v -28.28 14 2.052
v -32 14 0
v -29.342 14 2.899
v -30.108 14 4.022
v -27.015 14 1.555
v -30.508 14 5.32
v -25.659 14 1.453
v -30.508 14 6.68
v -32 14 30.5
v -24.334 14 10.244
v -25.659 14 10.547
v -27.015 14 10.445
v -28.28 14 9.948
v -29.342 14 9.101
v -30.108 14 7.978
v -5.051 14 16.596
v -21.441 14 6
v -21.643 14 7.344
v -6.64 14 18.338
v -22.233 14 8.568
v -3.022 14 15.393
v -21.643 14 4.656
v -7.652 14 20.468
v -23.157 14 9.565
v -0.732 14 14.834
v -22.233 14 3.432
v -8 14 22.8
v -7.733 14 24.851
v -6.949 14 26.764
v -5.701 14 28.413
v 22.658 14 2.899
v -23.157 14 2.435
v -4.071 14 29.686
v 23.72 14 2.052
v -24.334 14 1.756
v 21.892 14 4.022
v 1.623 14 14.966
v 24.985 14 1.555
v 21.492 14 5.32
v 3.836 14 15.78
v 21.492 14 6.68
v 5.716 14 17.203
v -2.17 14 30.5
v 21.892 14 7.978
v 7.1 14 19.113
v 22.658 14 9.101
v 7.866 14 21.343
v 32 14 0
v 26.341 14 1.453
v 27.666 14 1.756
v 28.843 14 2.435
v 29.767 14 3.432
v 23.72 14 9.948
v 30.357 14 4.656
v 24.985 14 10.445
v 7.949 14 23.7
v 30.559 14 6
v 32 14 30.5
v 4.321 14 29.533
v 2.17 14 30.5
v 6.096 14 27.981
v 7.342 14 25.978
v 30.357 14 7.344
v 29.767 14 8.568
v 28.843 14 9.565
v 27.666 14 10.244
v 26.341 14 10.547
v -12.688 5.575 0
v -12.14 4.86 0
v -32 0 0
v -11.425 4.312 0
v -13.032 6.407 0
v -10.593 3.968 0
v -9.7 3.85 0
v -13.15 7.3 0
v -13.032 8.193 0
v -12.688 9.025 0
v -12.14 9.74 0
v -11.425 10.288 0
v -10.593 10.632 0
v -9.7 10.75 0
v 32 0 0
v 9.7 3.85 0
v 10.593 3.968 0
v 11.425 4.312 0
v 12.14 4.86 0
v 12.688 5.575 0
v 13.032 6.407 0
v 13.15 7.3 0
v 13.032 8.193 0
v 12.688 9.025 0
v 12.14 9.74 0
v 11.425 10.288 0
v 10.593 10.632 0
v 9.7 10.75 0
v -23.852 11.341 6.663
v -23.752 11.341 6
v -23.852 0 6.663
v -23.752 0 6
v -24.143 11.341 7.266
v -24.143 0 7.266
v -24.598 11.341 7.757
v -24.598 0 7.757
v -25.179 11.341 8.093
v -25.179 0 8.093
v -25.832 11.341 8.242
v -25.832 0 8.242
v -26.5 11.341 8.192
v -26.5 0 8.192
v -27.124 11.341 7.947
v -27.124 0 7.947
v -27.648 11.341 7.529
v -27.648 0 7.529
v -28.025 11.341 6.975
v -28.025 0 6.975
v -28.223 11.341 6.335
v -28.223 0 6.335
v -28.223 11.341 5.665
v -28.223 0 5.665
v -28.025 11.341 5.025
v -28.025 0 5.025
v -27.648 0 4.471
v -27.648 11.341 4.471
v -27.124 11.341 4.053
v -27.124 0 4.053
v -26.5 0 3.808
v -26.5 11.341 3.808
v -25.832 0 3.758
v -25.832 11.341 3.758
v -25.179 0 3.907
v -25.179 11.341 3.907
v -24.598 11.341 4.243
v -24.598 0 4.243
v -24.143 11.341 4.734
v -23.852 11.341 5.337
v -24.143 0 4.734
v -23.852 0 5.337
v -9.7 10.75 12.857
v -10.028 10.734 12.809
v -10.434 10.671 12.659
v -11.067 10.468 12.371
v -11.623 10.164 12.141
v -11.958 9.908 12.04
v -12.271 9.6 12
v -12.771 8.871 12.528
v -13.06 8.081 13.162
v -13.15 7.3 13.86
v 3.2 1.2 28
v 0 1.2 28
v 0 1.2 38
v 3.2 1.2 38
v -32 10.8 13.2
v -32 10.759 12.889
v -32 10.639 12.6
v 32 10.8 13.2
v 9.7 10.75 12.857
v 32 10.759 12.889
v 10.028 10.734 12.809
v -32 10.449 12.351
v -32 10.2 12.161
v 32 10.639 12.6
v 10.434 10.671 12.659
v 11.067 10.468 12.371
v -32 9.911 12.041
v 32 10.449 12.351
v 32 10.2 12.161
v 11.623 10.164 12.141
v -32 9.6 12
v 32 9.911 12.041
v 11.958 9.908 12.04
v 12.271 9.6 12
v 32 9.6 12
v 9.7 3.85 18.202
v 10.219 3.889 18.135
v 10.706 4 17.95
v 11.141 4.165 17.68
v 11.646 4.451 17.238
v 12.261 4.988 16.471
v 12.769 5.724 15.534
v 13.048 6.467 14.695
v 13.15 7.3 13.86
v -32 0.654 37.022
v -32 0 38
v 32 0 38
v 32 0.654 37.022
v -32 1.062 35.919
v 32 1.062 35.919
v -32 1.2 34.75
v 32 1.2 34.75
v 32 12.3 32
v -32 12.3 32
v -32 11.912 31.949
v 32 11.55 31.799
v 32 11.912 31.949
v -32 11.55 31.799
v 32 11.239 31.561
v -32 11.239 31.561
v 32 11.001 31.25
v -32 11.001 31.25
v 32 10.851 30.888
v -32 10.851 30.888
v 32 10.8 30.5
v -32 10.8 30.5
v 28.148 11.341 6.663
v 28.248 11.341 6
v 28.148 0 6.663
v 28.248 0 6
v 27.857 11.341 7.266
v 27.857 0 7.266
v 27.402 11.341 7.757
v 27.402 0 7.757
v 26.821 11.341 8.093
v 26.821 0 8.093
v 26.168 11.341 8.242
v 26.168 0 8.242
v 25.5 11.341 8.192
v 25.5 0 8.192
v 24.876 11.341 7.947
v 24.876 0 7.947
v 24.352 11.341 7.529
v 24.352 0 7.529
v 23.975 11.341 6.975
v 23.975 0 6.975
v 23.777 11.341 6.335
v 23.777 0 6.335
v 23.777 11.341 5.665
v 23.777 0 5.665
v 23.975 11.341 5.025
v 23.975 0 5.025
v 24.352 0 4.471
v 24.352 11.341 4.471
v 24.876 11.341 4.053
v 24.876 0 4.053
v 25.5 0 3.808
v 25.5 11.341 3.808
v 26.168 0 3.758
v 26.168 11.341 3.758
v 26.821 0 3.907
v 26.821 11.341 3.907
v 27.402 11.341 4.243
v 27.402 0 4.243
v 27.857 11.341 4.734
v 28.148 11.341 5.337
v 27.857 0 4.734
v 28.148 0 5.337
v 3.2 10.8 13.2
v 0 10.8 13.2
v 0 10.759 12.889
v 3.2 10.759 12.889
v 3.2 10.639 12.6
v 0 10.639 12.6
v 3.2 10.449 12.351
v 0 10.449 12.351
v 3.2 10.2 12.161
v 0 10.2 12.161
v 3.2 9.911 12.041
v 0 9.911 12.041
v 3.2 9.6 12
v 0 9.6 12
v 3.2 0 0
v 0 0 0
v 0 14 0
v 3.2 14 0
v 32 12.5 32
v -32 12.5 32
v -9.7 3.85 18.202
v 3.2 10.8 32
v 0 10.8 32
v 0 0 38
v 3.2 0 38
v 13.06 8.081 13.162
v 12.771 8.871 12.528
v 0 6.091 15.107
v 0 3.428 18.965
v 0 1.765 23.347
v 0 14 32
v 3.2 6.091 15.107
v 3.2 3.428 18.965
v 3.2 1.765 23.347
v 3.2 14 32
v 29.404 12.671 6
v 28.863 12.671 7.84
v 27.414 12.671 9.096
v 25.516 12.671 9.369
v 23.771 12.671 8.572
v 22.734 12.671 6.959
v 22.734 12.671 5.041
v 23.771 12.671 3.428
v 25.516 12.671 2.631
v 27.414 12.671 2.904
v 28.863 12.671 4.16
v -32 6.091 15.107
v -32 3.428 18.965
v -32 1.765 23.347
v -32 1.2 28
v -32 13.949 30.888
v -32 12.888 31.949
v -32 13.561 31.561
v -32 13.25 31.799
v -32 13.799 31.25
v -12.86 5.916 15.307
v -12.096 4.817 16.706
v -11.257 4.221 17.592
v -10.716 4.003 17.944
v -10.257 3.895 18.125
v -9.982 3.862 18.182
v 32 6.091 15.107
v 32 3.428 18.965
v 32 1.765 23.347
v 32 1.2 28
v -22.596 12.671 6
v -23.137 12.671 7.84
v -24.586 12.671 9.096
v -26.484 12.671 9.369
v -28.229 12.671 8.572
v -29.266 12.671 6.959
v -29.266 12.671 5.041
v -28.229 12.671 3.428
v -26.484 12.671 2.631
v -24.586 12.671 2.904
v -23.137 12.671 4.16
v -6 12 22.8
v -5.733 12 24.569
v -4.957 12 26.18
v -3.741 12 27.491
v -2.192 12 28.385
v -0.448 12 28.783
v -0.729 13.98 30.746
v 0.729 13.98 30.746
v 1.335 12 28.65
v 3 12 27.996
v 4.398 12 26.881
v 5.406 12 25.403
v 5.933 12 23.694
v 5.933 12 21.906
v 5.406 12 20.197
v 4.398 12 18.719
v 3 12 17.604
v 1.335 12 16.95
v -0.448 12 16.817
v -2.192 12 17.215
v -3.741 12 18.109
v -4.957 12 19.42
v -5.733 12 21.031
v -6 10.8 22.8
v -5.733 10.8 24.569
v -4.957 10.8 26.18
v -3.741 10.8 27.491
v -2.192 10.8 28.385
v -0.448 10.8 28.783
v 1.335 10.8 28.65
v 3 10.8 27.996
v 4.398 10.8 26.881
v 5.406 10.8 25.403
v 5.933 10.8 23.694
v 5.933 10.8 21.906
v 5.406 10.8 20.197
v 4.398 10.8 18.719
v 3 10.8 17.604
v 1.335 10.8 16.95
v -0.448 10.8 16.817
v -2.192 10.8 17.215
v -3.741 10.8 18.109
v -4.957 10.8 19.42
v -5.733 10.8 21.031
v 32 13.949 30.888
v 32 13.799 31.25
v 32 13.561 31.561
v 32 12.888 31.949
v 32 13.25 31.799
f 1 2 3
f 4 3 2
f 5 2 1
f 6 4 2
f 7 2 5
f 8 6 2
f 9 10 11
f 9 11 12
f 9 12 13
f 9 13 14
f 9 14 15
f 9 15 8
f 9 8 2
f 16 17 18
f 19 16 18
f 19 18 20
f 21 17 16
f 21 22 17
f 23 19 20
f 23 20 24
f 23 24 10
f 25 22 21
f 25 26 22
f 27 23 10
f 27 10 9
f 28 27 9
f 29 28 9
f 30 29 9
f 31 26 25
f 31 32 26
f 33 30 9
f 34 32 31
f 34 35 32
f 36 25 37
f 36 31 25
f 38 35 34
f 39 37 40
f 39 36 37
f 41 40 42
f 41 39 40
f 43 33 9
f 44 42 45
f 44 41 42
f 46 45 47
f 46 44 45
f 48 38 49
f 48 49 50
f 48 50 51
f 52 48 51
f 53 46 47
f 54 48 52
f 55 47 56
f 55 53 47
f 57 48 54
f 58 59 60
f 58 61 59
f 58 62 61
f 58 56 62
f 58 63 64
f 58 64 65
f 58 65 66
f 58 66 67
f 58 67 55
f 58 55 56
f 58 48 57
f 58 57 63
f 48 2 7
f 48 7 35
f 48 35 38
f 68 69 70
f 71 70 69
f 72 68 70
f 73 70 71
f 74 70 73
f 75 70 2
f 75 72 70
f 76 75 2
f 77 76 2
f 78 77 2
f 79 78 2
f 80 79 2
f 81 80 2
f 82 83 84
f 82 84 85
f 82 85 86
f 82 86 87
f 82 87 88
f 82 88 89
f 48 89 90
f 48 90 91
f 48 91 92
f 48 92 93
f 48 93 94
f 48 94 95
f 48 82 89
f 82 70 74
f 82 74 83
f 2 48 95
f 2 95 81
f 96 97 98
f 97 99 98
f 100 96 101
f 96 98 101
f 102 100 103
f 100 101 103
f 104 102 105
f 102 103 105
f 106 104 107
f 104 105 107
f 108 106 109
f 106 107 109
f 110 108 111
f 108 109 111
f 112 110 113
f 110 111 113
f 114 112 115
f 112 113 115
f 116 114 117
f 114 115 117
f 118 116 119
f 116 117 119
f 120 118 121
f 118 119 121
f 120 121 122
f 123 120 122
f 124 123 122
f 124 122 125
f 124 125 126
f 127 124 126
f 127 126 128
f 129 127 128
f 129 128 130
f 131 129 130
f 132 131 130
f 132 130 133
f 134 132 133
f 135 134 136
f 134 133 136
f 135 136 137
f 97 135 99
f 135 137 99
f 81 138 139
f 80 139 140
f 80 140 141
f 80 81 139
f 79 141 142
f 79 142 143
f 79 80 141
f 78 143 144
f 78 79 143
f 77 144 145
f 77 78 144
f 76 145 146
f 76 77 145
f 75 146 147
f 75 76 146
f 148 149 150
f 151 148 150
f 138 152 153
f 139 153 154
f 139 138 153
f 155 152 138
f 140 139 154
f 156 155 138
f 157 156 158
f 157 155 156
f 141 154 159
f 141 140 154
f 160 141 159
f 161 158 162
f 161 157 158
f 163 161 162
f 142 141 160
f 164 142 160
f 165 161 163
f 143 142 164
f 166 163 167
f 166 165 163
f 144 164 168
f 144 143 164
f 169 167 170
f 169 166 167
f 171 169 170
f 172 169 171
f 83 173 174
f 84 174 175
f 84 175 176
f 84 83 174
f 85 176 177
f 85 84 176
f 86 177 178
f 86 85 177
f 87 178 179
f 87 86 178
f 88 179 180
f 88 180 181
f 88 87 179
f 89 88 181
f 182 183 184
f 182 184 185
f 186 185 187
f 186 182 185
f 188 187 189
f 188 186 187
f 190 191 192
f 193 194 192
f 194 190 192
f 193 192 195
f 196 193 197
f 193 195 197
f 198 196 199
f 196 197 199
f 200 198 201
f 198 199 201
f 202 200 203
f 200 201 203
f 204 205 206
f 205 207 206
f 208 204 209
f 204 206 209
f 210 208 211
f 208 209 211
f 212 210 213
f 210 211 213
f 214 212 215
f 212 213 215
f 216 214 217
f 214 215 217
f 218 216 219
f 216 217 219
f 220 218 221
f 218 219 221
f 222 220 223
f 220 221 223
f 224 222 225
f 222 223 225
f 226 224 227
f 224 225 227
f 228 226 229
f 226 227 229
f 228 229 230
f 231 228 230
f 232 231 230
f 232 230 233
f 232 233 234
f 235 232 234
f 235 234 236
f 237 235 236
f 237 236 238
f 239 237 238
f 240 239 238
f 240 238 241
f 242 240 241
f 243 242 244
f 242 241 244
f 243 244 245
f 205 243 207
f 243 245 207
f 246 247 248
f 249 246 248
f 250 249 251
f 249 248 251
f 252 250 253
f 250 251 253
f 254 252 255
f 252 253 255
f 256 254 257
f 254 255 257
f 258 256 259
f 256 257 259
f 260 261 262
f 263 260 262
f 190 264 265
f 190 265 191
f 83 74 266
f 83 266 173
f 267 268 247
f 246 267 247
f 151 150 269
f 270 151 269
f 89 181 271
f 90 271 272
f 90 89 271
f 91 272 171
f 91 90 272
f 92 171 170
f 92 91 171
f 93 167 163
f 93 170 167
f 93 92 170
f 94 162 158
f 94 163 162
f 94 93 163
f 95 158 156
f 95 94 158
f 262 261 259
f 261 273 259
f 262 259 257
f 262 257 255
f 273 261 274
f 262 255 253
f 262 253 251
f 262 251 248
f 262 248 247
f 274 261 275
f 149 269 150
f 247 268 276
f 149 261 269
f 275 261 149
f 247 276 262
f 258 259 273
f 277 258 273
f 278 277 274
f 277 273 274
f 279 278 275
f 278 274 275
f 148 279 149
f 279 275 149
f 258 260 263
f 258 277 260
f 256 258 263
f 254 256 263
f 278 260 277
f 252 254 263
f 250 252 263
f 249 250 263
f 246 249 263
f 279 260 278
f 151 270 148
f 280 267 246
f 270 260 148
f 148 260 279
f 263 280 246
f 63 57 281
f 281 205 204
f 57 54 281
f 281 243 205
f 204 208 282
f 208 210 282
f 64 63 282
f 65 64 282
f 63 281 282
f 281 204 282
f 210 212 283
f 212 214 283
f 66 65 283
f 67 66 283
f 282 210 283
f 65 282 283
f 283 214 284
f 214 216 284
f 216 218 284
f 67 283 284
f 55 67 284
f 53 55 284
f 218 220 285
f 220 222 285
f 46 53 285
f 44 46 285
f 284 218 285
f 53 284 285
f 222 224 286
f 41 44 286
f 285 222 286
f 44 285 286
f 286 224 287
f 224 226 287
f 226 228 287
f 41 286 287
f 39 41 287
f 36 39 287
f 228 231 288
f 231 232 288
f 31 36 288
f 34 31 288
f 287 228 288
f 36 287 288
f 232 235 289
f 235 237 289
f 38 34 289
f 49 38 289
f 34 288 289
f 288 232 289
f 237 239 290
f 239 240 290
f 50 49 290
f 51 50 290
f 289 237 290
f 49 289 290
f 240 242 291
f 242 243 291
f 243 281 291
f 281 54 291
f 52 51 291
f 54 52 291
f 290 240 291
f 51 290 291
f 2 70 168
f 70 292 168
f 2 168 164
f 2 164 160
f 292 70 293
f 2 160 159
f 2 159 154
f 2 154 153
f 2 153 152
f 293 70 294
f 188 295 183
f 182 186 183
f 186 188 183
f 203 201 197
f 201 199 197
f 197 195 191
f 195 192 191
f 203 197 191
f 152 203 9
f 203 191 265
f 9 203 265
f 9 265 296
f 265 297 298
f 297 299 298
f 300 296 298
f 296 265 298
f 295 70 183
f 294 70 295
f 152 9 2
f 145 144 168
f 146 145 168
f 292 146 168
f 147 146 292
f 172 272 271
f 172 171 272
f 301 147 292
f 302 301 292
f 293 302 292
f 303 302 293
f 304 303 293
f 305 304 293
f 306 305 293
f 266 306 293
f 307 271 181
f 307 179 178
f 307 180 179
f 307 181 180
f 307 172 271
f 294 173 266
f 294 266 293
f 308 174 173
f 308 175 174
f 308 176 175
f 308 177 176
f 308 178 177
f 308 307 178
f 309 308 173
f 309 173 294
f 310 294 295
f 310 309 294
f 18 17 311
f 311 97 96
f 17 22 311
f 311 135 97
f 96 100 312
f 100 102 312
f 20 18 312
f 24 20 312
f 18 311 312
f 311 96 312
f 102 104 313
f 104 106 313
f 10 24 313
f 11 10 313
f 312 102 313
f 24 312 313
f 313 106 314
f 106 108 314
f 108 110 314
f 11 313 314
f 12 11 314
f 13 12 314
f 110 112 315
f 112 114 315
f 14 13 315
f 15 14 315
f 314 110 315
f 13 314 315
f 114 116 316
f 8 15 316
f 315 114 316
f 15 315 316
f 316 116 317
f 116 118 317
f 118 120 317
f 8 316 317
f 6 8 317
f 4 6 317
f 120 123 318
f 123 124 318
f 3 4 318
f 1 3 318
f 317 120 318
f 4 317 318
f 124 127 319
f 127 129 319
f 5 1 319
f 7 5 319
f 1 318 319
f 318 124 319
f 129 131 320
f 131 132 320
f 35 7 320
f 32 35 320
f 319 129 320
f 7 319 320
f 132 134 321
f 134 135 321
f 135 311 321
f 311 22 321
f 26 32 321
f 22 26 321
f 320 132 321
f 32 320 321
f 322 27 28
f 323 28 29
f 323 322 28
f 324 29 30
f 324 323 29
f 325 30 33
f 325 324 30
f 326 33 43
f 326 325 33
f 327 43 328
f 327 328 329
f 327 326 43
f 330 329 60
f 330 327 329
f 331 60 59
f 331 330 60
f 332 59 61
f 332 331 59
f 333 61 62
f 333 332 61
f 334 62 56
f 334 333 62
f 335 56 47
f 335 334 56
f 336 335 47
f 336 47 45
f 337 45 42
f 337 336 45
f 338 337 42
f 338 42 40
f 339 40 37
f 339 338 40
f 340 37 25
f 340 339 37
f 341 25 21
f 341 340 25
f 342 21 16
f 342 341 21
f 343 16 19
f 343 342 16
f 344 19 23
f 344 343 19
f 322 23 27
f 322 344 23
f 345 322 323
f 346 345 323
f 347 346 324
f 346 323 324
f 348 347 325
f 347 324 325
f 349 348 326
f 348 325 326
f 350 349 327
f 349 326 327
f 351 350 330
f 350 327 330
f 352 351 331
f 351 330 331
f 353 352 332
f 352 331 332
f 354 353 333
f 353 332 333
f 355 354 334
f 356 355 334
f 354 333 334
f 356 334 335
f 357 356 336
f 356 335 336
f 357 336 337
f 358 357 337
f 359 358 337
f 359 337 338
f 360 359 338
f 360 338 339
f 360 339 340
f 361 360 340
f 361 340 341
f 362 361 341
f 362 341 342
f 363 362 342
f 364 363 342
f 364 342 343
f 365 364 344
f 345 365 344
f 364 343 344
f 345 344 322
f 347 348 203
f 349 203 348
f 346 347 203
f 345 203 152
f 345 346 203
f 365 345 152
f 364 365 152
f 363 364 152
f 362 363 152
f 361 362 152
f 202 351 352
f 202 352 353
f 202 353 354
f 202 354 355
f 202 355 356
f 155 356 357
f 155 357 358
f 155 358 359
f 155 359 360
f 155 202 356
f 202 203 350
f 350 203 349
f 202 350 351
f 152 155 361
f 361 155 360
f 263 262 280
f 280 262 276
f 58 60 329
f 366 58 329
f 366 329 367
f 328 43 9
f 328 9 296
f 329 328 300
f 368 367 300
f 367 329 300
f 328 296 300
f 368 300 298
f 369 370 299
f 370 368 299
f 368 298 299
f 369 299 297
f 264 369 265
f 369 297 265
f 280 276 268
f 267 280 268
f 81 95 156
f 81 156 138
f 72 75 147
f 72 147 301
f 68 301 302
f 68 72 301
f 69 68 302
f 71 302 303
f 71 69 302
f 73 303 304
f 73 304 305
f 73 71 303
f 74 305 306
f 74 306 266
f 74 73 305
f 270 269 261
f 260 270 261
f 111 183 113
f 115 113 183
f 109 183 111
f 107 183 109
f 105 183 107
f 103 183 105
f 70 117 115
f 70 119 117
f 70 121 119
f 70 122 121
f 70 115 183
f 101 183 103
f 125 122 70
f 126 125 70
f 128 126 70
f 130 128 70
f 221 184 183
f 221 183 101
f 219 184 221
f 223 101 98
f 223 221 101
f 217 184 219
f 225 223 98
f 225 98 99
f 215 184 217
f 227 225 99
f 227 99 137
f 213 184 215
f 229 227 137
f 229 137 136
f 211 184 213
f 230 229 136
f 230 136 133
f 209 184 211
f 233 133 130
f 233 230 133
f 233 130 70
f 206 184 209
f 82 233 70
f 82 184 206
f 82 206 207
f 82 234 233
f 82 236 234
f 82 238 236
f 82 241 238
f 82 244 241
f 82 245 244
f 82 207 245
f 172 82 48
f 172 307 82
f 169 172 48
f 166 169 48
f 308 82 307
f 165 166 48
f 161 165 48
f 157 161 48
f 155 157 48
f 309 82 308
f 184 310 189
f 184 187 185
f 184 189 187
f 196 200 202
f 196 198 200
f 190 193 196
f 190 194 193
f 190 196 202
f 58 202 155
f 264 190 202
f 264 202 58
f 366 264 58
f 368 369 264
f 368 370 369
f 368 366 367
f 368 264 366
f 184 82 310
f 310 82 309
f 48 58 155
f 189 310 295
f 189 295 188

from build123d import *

# Parameters (mm, degrees)
F1_DEPTH       = 3.2
F2_DEPTH       = 32
F4_DEPTH       = 38.001
F5_R           = 6
F6_DEPTH       = 3.2
F7_SIZE        = 2
F8_T1_DEPTH    = 71.5
F9_D           = 4.4958
F9_CSINK_D     = 9.1186
F9_CSINK_ANGLE = 82
F10_T1_DEPTH   = 80.2480768093


# Not quite as in the source:
# - a fillet or chamfer that OpenCascade refuses, or shapes differently, is made with other operations: its cross-section is extruded or revolved along the edge and cut away or added


with BuildPart() as f1:
    # F0 (on Right) → F1 (new body)
    with BuildSketch(Plane.YZ):
        with BuildLine():
            Line((1.2, 28), (1.2, 38))
            Line((1.2, 38), (0, 38))
            Line((0, 38), (0, 0))
            Line((0, 0), (14, 0))
            Line((14, 0), (14, 32))
            Line((14, 32), (10.8, 32))
            Line((10.8, 32), (10.8, 13.2))
            ThreePointArc((10.8, 13.2), (10.4485281374, 12.3514718626), (9.6, 12))
            ThreePointArc((9.6, 12), (3.4276464791, 18.9645144015), (1.2, 28))
        make_face()
    extrude(amount=F1_DEPTH)


with BuildPart() as f2:
    # F0 (on Right) → F2 (new body, symmetric)
    with BuildSketch(Plane.YZ):
        with BuildLine():
            Line((1.2, 28), (1.2, 38))
            Line((1.2, 38), (0, 38))
            Line((0, 38), (0, 0))
            Line((0, 0), (14, 0))
            Line((14, 0), (14, 32))
            Line((14, 32), (10.8, 32))
            Line((10.8, 32), (10.8, 13.2))
            ThreePointArc((10.8, 13.2), (10.4485281374, 12.3514718626), (9.6, 12))
            ThreePointArc((9.6, 12), (3.4276464791, 18.9645144015), (1.2, 28))
        make_face()
    extrude(amount=F2_DEPTH, both=True)

    # F3 (on Top) → F4 (cut, through all)
    with BuildSketch(Plane.XY):
        with BuildLine():
            ThreePointArc((13.15, 7.3), (12.1395183951, 9.7395183951), (9.7, 10.75))
            Line((9.7, 10.75), (-9.7, 10.75))
            ThreePointArc((-9.7, 10.75), (-12.1395183951, 9.7395183951), (-13.15, 7.3))
            ThreePointArc((-13.15, 7.3), (-12.1395183951, 4.8604816049), (-9.7, 3.85))
            Line((-9.7, 3.85), (9.7, 3.85))
            ThreePointArc((9.7, 3.85), (12.1395183951, 4.8604816049), (13.15, 7.3))
        make_face()
    extrude(amount=F4_DEPTH, mode=Mode.SUBTRACT)

    # F5 (on face) → F6 (cut, through all)
    with BuildSketch(Plane(origin=(0, 14, 0), x_dir=(-1, 0, 0), z_dir=(0, 1, 0))):
        with Locations((0, 22.8)):
            Circle(F5_R)
    extrude(amount=-F6_DEPTH, mode=Mode.SUBTRACT)

    # F7
    f7_edges = [f2.edges().sort_by_distance(p)[0] for p in [
        (6, 14, 22.8),
    ]]
    chamfer(f7_edges, length=F7_SIZE)

    # F8: fillet of radius 1.5 on 2 edges, made by hand

    # F8_s2 → F8_t1 (cut)
    with BuildSketch(Plane.YZ.offset(-35.75)):
        with BuildLine():
            ThreePointArc((14, 30.5), (13.5606601718, 31.5606601718), (12.5, 32))
            Line((12.5, 32), (14, 32))
            Line((14, 32), (14, 30.5))
        make_face()
        with BuildLine():
            ThreePointArc((12.3, 32), (11.2393398282, 31.5606601718), (10.8, 30.5))
            Line((10.8, 30.5), (10.8, 32))
            Line((10.8, 32), (12.3, 32))
        make_face()
    extrude(amount=F8_T1_DEPTH, mode=Mode.SUBTRACT)

    # F9 (through all)
    with Locations(Plane(origin=(0, 14, 0), x_dir=(-1, 0, 0), z_dir=(0, 1, 0))):
        with Locations((-26, 6), (26, 6)):
            CounterSinkHole(F9_D / 2, F9_CSINK_D / 2, counter_sink_angle=F9_CSINK_ANGLE)

    # F10: fillet of radius 5 on 1 edges, made by hand

    # F10_s2 → F10_t1 (cut)
    with BuildSketch(Plane.YZ.offset(-40.1240384046)):
        with BuildLine():
            ThreePointArc((0, 38), (0.8904157598, 36.4824354457), (1.2, 34.7503846381))
            Line((1.2, 34.7503846381), (1.2, 38))
            Line((1.2, 38), (0, 38))
        make_face()
    extrude(amount=F10_T1_DEPTH, mode=Mode.SUBTRACT)


solid = Compound([f1.part, f2.part])
